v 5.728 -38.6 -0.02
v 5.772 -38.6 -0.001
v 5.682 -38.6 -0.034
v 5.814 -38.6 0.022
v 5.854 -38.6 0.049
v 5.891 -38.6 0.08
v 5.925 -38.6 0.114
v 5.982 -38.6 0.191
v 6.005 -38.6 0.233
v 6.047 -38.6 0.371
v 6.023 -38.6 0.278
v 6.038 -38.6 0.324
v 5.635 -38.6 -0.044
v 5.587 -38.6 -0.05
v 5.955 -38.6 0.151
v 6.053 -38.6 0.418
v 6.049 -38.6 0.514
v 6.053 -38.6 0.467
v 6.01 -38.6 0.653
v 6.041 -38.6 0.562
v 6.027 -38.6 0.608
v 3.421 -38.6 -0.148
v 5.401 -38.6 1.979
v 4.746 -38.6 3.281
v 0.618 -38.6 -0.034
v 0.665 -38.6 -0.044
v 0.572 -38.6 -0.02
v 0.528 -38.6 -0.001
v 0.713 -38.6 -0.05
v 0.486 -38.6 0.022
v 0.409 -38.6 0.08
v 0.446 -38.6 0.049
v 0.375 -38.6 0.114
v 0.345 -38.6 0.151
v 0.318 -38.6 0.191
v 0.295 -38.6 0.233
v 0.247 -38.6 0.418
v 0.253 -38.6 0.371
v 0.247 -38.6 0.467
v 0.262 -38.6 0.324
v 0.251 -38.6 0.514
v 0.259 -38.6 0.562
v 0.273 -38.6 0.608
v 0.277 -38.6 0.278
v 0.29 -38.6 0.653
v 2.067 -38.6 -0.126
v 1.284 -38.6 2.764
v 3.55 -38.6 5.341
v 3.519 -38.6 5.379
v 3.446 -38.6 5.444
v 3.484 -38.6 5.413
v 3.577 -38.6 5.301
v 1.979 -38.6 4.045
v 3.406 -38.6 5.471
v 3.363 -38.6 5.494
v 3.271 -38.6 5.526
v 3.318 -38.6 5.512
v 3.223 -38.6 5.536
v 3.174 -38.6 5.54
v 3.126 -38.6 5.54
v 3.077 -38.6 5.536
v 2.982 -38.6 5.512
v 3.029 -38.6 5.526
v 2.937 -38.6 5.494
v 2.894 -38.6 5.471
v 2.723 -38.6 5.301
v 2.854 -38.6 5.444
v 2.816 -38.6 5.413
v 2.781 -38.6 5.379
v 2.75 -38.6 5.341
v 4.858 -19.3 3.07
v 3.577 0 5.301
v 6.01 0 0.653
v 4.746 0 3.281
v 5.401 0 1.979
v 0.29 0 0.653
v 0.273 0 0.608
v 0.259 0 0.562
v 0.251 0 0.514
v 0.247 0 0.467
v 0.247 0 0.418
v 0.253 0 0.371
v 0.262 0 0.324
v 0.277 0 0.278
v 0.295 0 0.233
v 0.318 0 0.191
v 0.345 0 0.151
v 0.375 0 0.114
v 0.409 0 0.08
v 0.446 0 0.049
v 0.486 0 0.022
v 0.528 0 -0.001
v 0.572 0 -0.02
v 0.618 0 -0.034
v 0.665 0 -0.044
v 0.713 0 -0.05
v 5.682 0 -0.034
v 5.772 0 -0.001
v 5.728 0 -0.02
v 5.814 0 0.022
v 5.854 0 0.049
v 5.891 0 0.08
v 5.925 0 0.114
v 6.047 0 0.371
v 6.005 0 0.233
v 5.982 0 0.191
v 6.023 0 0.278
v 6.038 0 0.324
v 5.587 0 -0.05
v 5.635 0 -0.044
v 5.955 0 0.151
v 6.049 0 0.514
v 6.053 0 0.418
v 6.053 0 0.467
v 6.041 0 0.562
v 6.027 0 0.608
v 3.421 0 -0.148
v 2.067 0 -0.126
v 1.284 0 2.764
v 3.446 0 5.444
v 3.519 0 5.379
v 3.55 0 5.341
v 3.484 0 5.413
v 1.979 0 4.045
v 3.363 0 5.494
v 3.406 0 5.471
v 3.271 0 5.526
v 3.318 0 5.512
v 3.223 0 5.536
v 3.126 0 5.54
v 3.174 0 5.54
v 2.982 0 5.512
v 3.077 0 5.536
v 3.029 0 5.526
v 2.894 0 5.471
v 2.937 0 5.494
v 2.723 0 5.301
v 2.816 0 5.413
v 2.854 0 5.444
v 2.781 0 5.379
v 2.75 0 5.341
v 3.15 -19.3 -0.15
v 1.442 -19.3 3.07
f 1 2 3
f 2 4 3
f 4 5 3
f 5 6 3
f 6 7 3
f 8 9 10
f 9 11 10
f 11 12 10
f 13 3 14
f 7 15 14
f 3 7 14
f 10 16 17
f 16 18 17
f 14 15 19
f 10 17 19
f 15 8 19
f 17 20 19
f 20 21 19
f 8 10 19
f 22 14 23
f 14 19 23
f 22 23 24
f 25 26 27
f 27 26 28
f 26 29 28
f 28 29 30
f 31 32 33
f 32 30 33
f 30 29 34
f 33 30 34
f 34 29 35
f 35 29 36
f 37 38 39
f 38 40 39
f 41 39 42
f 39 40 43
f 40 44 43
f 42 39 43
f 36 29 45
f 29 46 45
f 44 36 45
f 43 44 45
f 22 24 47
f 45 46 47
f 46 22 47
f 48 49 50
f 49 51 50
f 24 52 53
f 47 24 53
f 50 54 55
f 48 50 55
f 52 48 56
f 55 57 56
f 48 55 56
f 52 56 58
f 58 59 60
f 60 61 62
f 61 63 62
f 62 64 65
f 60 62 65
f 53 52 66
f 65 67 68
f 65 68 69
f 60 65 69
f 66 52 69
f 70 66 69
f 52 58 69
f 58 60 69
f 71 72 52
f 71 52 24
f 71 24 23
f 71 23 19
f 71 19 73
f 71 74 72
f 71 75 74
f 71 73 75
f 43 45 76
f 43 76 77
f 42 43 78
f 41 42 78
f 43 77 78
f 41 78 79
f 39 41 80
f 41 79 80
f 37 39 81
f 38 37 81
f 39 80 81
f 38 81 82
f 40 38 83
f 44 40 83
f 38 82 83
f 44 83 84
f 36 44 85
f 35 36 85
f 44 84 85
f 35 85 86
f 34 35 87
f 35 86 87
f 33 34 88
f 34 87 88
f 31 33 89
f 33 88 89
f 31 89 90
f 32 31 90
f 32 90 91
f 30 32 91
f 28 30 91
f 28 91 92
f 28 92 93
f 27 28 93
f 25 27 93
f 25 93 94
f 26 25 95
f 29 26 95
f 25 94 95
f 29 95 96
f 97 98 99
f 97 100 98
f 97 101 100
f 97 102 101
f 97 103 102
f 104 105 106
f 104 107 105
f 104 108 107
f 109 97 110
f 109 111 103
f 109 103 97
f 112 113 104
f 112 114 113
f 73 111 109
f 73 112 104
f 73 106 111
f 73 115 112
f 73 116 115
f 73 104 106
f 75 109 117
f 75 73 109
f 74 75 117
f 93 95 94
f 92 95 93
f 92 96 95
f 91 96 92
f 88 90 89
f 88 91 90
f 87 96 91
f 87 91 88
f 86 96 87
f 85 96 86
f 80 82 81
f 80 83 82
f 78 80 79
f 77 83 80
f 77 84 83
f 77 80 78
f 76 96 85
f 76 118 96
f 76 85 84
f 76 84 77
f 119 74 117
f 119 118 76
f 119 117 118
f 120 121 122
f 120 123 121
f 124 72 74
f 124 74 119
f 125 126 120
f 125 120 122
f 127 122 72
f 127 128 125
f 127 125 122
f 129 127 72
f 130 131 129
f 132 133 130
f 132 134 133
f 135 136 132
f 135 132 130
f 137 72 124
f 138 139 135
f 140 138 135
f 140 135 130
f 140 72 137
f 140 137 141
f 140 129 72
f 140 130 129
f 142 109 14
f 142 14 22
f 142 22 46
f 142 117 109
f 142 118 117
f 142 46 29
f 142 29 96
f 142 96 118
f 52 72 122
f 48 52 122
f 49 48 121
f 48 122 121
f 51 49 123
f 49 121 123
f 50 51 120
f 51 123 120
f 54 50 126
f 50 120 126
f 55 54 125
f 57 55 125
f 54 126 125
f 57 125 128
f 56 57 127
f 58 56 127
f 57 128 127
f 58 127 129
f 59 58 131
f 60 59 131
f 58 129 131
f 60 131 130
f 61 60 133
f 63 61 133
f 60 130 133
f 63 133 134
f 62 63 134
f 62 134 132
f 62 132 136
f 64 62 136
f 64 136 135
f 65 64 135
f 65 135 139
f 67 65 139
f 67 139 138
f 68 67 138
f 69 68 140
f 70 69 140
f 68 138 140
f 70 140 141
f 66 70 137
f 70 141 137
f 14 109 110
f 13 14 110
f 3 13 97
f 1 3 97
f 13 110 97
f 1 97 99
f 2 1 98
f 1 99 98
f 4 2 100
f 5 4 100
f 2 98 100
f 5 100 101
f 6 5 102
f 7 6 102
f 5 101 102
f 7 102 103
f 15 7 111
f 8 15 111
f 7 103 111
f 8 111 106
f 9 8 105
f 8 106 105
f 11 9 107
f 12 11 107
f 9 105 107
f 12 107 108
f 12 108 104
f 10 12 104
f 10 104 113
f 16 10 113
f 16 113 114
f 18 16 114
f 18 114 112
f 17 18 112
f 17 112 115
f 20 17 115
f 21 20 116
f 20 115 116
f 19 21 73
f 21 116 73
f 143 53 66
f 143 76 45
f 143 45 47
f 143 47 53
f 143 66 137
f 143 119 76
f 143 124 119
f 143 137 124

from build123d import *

# Parameters (mm, degrees)
F1_DEPTH = 38.6


with BuildPart() as f1:
    # F0 (on Front) → F1 (new body)
    with BuildSketch(Plane.XZ):
        with BuildLine():
            add(Edge.make_bspline(
                [(0.290014, 0.652725), (0.654464, 1.468686), (1.386119, 3.059577), (2.276955, 4.566897), (2.72267, 5.300609)],
                knots=[0.713428, 0.713428, 0.713428, 0.713428, 3.391626, 5.964573, 5.964573, 5.964573, 5.964573], degree=3))
            ThreePointArc((0.290014, 0.652725), (0.318085, 0.19109), (0.712737, -0.050041))
            add(Edge.make_bspline(
                [(5.587263, -0.050041), (4.774842, -0.1051), (3.15, -0.1949), (1.525158, -0.1051), (0.712737, -0.050041)],
                knots=[0.713545, 0.713545, 0.713545, 0.713545, 3.153569, 5.593594, 5.593594, 5.593594, 5.593594], degree=3))
            ThreePointArc((5.587263, -0.050041), (5.981915, 0.19109), (6.009986, 0.652725))
            add(Edge.make_bspline(
                [(3.57733, 5.300609), (4.023045, 4.566897), (4.913881, 3.059577), (5.645536, 1.468686), (6.009986, 0.652725)],
                knots=[0.818678, 0.818678, 0.818678, 0.818678, 3.391626, 6.069824, 6.069824, 6.069824, 6.069824], degree=3))
            ThreePointArc((3.57733, 5.300609), (3.15, 5.541014), (2.72267, 5.300609))
        make_face()
    extrude(amount=F1_DEPTH)


solid = f1.part
